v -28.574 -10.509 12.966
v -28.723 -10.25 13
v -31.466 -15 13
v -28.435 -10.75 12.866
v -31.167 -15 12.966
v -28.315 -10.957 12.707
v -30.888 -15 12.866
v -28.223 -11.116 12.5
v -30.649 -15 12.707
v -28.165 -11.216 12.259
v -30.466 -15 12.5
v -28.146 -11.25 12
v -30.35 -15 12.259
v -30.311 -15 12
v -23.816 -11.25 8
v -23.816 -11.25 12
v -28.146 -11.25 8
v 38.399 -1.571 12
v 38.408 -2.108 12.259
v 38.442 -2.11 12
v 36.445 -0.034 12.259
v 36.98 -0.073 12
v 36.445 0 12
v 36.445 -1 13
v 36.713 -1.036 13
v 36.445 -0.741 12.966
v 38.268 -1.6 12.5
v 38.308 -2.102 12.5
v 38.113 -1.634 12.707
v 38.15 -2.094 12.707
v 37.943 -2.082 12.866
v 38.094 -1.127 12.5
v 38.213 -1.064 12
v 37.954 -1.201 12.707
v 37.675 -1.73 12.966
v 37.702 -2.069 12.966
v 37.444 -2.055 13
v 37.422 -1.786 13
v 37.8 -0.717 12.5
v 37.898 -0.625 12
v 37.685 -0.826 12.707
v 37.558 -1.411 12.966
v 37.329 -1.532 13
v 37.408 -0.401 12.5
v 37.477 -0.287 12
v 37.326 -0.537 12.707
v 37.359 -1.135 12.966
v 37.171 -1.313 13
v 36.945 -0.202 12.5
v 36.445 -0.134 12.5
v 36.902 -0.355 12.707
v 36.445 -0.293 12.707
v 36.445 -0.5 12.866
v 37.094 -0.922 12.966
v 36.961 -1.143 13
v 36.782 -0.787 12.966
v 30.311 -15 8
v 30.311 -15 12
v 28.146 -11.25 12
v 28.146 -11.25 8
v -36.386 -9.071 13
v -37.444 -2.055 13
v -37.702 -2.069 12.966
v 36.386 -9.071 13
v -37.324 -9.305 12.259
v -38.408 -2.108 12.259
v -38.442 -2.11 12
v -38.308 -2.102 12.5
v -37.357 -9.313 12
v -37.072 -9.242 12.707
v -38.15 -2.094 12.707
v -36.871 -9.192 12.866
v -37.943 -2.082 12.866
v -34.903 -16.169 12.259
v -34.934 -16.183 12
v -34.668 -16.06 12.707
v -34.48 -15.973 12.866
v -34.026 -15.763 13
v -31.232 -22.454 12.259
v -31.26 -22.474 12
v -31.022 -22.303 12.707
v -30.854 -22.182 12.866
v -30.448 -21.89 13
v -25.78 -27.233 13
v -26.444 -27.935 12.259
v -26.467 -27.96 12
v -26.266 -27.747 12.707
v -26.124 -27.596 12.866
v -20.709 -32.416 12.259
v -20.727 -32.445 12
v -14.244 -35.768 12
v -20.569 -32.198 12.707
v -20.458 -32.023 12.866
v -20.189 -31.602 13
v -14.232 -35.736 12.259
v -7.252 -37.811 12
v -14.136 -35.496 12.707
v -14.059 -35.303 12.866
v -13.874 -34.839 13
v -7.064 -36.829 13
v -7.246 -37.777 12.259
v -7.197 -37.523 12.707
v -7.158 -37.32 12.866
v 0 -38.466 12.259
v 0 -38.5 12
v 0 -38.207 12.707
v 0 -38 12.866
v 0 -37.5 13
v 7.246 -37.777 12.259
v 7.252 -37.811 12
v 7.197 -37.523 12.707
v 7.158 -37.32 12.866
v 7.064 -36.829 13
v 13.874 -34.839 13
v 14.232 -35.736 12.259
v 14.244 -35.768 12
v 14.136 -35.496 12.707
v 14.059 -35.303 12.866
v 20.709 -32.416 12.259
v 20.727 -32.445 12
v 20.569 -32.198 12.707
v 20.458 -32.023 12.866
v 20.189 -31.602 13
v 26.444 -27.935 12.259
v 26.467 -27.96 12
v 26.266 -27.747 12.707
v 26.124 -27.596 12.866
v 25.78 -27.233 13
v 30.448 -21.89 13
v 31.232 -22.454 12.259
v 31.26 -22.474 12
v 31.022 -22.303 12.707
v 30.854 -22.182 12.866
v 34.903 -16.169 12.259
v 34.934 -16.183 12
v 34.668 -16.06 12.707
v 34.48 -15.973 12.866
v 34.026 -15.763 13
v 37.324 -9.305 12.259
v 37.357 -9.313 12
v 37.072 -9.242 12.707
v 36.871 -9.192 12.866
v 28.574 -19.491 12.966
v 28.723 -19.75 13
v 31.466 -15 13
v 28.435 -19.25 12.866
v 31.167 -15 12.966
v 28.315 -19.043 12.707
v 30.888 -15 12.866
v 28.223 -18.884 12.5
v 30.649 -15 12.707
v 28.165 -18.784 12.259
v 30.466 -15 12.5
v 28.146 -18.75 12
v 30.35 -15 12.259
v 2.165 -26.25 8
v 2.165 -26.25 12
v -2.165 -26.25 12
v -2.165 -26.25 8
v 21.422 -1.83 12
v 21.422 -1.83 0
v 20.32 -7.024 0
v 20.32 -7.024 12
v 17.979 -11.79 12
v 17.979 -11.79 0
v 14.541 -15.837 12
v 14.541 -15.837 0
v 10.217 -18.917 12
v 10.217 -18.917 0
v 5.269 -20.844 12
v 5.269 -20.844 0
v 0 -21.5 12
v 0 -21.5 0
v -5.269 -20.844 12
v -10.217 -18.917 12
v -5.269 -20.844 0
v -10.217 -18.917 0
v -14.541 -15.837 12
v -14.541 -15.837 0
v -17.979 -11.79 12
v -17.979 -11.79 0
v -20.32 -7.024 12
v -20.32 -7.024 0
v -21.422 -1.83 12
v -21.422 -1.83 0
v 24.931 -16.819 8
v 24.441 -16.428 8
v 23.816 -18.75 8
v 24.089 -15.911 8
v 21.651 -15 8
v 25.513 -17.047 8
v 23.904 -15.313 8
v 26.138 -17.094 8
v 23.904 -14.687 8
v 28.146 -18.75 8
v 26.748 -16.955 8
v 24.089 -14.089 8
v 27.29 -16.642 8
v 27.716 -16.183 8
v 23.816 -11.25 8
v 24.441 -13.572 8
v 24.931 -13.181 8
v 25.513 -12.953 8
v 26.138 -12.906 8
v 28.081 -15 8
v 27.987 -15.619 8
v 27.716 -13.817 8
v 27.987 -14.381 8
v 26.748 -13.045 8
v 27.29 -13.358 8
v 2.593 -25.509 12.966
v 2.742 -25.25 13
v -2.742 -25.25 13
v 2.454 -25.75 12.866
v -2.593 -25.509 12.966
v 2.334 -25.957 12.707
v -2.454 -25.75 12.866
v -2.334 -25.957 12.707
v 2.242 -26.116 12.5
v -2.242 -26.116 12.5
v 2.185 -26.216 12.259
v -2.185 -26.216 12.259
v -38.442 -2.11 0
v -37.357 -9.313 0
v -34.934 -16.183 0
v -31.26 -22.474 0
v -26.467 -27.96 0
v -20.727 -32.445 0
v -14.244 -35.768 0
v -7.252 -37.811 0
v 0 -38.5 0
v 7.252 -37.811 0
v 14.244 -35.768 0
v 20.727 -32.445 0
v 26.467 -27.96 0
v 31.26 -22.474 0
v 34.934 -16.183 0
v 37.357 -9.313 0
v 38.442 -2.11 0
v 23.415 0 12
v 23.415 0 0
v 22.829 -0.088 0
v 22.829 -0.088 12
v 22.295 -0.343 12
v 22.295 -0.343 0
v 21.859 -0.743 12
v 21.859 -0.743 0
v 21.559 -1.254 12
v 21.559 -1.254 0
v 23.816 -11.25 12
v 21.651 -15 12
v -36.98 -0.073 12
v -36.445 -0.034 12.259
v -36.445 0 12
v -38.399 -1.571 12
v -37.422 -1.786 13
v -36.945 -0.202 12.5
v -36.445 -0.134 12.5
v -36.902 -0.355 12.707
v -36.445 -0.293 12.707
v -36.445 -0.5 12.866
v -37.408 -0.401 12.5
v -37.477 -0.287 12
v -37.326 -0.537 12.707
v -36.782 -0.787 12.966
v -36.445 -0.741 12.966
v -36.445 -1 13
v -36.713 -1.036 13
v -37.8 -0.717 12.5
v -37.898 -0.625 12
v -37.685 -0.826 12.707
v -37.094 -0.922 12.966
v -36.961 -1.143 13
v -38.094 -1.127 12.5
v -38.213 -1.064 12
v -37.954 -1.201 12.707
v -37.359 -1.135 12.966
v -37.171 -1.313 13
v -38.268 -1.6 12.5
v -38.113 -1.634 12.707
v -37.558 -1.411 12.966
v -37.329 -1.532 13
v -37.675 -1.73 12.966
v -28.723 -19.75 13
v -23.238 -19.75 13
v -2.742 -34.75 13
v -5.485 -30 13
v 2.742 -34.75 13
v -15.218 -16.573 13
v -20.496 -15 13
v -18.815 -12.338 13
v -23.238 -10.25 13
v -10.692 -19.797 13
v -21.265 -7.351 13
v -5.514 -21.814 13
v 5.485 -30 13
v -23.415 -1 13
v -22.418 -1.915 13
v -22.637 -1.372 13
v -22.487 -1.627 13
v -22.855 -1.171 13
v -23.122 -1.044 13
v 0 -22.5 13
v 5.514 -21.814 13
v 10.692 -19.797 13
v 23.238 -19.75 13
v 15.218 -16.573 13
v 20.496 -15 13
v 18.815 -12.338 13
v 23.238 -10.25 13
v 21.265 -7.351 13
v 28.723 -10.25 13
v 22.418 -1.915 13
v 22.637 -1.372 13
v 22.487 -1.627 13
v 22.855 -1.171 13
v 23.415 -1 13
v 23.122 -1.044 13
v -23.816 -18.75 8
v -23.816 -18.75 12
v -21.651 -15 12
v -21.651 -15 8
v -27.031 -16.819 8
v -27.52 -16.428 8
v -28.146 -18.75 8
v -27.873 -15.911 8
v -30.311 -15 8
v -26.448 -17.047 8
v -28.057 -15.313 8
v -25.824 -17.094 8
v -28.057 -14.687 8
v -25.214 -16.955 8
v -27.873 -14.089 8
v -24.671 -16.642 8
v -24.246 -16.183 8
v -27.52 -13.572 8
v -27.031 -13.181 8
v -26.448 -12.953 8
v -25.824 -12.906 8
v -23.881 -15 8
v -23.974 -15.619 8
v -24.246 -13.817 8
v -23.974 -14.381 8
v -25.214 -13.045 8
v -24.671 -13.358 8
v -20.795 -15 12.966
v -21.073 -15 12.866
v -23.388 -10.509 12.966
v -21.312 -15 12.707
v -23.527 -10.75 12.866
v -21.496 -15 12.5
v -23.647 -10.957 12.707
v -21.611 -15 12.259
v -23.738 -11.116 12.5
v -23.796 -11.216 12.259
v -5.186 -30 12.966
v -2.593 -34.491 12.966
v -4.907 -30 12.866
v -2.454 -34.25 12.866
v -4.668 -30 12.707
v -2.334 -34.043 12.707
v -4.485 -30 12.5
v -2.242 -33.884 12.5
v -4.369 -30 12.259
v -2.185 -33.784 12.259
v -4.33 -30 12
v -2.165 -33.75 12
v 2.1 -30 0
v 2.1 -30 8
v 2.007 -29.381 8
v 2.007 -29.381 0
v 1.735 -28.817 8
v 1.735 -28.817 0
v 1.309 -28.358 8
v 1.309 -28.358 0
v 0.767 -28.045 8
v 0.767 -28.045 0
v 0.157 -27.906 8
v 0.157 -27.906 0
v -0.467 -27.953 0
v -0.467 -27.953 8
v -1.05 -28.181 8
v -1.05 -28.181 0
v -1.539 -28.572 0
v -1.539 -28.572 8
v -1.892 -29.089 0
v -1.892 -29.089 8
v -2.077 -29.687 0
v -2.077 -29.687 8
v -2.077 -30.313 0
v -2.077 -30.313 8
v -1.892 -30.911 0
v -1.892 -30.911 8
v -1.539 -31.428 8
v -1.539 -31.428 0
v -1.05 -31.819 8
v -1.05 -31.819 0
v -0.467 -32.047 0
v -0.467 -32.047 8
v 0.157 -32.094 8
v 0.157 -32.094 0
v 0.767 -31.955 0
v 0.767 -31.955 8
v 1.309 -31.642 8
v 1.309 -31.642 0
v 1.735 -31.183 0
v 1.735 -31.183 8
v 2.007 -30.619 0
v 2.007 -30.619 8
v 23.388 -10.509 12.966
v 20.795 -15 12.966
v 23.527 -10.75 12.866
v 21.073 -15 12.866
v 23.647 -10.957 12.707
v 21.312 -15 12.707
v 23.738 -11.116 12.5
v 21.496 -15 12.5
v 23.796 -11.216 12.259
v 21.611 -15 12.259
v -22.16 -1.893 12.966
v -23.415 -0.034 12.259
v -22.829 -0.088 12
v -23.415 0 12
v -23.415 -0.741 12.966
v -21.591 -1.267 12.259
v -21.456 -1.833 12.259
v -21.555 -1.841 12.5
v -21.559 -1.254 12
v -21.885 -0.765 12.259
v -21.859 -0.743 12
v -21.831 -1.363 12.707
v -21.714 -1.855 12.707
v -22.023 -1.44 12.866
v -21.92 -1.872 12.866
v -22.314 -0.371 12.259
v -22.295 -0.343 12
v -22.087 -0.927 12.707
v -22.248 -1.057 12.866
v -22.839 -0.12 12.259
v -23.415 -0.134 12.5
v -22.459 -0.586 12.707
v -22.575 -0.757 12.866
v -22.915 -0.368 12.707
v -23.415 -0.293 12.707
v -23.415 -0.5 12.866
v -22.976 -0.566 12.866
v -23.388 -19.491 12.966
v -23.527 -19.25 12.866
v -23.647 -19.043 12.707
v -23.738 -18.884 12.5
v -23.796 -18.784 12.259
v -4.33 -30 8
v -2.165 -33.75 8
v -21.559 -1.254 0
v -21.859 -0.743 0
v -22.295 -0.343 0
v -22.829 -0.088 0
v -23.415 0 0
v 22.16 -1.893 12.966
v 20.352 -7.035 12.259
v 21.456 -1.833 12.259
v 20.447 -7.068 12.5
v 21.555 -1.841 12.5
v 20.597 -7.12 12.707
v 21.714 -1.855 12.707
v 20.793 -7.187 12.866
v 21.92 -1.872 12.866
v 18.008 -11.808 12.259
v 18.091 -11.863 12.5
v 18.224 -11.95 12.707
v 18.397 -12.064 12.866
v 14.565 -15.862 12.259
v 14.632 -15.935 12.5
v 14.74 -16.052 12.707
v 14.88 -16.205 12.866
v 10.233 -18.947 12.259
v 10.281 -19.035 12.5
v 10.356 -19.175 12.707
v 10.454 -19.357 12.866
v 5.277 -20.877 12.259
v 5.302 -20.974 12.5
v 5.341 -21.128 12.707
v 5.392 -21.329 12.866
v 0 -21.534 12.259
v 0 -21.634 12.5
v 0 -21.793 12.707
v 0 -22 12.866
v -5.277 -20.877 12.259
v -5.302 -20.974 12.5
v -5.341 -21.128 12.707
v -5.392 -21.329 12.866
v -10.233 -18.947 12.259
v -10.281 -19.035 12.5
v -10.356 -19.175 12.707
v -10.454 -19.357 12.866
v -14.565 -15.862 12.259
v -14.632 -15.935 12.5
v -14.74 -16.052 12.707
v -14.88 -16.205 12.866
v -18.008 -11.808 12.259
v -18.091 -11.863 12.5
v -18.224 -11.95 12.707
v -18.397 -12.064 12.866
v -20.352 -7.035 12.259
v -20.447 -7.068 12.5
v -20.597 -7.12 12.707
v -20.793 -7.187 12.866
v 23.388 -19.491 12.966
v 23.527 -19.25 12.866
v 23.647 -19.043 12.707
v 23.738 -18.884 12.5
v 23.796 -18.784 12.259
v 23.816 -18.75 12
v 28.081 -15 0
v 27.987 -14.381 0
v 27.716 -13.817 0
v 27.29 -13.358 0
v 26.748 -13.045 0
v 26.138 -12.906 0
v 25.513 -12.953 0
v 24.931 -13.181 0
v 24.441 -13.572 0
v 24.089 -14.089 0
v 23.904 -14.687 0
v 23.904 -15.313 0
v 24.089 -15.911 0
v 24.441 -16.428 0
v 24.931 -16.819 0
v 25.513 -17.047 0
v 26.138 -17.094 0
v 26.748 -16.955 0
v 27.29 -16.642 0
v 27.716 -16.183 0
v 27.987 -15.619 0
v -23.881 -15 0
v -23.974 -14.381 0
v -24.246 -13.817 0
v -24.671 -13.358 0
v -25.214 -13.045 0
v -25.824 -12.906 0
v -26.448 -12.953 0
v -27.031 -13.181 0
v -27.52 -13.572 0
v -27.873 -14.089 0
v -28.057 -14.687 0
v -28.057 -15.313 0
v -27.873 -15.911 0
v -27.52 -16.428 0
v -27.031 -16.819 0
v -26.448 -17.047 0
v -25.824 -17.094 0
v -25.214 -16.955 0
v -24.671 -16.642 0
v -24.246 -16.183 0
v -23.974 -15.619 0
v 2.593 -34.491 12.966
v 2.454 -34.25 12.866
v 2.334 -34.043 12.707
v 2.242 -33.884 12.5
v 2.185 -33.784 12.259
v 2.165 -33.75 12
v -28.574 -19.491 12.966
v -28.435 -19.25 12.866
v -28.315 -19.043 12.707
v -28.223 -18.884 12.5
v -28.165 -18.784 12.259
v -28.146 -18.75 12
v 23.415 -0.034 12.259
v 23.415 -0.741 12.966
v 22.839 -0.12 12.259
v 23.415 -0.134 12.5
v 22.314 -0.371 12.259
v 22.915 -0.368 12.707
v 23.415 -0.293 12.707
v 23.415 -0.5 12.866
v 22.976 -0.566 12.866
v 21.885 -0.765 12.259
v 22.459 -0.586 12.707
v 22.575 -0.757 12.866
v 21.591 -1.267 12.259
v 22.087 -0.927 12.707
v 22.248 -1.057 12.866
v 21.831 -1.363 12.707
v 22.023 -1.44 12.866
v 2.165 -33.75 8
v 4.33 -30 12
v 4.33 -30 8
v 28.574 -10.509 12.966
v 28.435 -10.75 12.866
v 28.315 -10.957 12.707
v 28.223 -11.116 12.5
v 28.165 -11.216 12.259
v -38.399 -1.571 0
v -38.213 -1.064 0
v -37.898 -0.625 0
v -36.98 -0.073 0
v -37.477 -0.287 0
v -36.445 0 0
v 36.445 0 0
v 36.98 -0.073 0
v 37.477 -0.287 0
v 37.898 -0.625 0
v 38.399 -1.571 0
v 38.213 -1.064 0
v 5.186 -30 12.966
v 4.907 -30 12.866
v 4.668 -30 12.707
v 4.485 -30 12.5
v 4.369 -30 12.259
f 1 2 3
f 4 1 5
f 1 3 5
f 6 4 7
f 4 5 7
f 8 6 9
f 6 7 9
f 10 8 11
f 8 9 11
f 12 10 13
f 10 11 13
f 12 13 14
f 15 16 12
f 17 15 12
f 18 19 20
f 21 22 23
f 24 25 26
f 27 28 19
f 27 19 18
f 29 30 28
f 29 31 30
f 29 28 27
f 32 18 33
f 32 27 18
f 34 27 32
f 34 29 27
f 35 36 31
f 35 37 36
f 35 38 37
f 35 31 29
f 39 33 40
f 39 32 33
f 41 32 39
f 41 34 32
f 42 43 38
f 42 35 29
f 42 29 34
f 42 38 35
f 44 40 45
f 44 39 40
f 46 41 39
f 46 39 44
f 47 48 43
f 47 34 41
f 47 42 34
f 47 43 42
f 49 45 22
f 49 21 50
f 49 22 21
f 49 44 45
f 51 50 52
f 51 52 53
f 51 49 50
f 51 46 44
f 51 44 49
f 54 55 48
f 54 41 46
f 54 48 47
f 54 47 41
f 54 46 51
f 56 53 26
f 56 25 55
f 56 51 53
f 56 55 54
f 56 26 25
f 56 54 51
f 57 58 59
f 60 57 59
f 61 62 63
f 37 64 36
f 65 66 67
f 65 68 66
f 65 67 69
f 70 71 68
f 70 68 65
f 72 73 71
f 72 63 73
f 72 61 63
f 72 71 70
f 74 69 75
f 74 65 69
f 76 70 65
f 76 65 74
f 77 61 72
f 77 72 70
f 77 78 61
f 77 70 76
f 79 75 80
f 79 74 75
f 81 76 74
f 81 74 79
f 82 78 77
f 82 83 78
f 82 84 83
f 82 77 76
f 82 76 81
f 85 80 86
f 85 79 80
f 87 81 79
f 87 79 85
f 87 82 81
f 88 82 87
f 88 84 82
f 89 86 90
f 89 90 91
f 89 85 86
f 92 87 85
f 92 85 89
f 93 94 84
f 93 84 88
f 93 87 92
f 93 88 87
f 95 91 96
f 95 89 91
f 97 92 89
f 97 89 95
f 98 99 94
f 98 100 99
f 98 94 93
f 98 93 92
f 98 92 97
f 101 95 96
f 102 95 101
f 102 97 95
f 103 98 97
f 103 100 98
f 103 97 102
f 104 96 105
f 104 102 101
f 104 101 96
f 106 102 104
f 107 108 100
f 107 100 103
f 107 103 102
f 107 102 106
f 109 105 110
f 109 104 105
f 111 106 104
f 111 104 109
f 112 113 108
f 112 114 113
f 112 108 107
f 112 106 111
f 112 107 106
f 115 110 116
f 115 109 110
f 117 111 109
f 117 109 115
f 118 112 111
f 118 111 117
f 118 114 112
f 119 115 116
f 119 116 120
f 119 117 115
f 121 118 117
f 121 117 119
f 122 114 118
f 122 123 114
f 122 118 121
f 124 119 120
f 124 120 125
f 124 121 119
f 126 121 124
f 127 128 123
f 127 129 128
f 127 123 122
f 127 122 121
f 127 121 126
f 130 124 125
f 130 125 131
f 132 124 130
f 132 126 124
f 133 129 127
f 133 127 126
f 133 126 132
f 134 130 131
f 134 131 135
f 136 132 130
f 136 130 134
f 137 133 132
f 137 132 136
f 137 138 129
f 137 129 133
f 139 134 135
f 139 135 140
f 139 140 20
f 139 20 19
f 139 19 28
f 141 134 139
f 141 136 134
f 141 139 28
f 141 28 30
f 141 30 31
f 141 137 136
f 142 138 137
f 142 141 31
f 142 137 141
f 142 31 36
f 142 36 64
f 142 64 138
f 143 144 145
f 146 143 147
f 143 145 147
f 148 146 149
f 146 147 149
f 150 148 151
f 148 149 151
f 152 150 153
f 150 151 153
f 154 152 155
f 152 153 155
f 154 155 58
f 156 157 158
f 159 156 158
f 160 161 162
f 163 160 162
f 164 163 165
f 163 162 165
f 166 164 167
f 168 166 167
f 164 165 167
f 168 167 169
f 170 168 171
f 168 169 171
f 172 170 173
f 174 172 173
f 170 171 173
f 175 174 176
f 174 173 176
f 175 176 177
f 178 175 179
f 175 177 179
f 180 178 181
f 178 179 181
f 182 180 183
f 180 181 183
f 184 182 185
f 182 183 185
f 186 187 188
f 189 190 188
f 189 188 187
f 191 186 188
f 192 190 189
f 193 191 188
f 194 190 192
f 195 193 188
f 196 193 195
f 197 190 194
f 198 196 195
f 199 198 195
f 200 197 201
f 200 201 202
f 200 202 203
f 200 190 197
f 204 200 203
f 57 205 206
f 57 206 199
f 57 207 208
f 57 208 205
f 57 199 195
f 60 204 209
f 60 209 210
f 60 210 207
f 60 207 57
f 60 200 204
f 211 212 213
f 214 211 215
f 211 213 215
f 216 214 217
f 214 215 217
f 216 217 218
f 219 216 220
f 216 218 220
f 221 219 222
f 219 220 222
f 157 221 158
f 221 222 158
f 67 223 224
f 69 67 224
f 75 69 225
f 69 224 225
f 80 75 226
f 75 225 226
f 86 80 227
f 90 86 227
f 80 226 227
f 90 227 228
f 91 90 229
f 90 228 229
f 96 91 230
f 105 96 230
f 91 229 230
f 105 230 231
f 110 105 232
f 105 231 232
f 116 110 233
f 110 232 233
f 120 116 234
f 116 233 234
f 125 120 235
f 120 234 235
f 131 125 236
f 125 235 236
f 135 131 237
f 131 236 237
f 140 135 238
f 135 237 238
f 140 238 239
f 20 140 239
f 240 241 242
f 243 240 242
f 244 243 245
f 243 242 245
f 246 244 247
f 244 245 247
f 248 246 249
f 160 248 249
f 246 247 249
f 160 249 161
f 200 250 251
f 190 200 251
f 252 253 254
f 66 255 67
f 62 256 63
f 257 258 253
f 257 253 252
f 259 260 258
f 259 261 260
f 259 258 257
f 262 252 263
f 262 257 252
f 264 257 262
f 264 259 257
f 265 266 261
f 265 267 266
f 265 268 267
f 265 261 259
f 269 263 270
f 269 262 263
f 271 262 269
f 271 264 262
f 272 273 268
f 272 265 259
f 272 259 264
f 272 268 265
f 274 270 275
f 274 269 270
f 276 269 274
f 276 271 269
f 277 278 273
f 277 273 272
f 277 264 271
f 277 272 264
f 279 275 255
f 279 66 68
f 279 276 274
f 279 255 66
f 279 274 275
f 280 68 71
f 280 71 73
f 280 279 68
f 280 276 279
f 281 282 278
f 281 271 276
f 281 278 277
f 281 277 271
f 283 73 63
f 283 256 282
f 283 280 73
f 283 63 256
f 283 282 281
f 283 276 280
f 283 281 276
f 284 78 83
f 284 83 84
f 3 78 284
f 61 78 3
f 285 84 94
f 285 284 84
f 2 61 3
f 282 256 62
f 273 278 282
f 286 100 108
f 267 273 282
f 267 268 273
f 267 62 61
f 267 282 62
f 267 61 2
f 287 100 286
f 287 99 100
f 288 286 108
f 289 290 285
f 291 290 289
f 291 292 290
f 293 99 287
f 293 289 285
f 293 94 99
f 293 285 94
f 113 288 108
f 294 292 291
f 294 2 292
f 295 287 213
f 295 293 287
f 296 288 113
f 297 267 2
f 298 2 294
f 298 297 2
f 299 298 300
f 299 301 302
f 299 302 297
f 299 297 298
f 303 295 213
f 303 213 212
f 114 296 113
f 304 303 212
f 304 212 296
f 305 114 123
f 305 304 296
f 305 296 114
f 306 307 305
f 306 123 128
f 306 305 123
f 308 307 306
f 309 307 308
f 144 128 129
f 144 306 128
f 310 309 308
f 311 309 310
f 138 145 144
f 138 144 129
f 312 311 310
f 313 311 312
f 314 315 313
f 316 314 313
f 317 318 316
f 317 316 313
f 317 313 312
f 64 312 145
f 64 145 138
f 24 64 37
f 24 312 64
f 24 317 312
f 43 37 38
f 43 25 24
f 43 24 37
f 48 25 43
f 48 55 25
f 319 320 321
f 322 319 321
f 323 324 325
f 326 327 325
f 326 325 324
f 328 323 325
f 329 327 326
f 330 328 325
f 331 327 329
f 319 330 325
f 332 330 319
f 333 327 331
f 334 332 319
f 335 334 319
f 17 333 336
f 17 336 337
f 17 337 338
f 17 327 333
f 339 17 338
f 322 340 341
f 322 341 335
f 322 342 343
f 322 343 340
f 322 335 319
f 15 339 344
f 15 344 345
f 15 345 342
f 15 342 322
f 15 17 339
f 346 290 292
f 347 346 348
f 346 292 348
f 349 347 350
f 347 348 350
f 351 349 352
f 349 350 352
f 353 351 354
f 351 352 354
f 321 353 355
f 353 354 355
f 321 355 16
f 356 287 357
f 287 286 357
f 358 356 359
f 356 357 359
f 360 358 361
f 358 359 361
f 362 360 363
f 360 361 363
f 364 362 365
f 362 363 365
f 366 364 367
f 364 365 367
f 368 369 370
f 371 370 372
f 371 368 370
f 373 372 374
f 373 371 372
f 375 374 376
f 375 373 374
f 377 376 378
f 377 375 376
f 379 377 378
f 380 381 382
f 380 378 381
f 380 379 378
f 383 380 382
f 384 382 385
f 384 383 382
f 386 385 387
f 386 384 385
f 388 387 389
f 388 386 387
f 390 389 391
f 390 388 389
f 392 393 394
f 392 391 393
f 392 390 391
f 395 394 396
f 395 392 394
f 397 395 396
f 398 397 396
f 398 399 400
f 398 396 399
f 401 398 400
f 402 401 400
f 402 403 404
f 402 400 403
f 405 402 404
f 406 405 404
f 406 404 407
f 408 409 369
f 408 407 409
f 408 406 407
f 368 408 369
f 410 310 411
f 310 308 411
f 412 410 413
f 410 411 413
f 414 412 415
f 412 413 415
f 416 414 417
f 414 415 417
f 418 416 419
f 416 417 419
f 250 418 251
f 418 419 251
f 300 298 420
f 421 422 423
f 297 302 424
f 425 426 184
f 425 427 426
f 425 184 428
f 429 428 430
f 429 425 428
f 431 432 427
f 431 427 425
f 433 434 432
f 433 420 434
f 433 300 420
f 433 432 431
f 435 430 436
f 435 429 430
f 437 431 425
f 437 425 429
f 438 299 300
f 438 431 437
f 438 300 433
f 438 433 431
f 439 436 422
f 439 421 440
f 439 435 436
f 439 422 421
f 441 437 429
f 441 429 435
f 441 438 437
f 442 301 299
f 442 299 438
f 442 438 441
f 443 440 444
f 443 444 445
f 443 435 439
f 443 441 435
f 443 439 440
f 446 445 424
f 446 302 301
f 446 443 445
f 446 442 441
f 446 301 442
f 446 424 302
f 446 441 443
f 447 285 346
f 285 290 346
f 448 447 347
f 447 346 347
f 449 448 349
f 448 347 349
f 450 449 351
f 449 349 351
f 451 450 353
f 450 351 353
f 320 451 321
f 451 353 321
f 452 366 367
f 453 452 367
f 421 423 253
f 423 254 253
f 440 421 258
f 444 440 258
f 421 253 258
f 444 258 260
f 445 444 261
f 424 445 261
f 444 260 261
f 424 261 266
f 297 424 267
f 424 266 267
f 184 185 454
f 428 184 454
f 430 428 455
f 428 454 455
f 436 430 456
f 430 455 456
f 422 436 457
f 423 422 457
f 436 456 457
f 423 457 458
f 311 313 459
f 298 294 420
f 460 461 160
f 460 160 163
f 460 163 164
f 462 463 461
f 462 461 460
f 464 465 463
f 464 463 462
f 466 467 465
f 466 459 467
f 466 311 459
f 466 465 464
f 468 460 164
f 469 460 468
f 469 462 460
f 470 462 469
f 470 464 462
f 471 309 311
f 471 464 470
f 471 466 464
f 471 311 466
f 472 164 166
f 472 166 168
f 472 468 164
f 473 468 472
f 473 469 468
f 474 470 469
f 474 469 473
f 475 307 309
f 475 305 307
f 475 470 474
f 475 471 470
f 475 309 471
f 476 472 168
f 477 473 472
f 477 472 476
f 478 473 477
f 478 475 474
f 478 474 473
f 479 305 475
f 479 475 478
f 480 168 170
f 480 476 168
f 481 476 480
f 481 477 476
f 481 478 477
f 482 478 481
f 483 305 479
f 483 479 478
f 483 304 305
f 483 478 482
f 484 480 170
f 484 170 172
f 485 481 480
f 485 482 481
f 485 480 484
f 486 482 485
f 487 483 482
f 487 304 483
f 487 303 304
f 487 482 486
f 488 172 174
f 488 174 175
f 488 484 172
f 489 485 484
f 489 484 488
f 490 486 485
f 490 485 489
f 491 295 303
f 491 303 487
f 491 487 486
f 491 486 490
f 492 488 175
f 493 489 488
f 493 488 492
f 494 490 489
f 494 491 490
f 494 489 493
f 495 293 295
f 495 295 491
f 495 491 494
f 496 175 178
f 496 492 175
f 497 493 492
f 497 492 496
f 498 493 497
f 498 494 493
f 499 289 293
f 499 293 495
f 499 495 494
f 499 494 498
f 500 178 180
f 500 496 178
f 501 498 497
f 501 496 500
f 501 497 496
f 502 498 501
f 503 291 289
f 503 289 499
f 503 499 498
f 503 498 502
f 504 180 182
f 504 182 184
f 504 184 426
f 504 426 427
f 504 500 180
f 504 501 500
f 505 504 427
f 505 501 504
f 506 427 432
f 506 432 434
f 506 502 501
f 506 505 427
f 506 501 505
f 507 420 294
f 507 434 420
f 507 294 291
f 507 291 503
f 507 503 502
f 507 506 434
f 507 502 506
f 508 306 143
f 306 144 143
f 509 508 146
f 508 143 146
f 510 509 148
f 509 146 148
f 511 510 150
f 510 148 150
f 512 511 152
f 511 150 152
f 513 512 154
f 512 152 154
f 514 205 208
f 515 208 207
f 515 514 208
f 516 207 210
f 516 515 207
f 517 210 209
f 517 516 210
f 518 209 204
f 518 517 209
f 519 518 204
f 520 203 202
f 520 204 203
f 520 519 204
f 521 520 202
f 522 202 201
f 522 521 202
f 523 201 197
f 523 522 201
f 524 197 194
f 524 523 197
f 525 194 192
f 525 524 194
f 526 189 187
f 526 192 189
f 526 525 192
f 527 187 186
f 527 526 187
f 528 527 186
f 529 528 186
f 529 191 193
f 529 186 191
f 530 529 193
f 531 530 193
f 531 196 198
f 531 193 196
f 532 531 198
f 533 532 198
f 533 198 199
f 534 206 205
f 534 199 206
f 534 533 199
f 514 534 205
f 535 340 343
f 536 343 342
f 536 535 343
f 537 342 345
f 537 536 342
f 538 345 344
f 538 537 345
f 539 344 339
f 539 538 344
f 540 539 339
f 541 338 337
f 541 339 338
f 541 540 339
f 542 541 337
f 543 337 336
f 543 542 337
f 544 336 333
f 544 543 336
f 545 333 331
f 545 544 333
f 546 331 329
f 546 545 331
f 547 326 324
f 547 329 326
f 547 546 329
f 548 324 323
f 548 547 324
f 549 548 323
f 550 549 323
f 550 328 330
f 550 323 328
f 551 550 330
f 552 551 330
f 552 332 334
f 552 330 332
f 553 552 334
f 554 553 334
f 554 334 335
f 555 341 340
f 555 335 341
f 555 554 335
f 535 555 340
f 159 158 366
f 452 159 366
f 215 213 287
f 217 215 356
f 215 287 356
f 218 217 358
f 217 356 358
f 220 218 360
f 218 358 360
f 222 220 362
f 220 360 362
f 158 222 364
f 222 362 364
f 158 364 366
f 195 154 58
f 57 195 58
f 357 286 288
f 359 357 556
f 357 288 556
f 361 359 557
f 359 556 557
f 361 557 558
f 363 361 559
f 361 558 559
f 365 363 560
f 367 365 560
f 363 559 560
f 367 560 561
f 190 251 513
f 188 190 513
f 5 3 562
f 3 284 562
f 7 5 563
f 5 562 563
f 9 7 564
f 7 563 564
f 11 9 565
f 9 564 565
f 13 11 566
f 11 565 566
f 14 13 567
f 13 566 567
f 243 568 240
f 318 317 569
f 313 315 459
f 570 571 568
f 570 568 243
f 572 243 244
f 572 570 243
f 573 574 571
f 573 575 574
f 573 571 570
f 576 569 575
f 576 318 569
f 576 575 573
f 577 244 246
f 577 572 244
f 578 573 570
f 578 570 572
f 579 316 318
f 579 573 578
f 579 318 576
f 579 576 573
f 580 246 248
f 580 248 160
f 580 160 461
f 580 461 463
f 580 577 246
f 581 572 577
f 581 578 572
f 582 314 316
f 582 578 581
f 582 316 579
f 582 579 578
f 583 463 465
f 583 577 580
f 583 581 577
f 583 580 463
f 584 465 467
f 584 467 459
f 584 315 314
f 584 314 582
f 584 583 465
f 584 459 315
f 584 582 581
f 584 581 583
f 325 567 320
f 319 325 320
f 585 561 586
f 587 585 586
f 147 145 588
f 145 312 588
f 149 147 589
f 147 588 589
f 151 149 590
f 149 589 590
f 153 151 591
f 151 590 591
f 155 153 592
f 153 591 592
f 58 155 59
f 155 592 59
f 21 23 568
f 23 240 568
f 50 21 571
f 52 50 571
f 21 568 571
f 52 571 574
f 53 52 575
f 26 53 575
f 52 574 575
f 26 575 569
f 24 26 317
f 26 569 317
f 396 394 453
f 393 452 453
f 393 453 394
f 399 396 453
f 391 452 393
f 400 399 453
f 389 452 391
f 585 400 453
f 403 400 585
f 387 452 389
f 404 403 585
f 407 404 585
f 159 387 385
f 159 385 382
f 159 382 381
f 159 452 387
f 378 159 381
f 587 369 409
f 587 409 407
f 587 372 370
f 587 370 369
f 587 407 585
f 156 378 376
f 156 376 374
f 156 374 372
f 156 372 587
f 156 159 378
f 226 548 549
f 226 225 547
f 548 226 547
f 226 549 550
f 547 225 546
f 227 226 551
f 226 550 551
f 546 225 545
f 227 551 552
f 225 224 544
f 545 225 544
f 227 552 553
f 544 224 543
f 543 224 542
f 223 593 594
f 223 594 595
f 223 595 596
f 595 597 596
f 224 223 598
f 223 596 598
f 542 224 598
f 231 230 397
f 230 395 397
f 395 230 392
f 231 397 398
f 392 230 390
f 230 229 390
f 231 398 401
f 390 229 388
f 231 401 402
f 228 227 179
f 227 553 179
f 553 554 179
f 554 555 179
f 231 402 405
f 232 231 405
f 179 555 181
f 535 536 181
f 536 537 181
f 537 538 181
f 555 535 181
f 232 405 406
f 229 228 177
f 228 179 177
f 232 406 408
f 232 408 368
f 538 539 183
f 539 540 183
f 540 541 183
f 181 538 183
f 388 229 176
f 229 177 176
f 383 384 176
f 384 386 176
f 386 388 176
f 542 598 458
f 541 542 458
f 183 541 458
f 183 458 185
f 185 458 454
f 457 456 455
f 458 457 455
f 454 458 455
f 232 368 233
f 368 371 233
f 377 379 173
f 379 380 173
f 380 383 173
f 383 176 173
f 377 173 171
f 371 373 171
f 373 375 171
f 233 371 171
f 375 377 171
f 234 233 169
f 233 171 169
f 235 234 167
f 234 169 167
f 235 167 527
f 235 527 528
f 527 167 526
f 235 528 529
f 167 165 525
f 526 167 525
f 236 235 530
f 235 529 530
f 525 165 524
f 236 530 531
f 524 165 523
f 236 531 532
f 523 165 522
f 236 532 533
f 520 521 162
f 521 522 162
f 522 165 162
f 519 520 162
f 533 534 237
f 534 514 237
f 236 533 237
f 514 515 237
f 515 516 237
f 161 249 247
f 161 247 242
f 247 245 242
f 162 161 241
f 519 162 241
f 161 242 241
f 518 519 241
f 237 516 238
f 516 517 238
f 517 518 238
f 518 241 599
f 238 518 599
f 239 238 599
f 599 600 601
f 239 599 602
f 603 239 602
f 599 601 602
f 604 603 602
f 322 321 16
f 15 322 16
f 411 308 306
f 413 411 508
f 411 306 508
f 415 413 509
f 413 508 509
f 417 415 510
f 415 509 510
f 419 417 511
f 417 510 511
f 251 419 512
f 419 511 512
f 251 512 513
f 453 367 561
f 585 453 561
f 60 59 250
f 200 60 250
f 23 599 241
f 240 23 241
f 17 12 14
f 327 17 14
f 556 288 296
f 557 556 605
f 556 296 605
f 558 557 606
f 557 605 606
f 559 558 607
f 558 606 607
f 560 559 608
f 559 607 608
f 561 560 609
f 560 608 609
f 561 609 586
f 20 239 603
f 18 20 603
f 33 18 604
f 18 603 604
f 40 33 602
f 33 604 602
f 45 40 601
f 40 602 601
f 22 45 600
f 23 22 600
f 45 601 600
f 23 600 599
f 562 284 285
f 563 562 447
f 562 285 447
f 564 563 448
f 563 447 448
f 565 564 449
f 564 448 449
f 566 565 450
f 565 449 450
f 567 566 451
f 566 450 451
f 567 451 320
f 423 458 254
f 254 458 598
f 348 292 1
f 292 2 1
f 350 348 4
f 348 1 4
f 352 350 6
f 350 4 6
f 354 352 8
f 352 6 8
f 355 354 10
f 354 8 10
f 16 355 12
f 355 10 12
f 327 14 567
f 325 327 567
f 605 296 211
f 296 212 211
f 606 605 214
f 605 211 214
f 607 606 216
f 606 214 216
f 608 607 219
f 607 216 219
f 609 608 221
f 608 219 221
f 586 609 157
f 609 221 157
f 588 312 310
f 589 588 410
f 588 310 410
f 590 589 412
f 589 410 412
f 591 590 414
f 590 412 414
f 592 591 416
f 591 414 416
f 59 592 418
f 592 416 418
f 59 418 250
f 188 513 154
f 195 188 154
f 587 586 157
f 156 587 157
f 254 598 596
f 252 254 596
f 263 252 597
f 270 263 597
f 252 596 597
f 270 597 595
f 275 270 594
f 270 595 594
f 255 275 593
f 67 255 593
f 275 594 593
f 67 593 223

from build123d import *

# Parameters (mm, degrees)
F1_DEPTH = 13
F2_R     = 2.1
F3_DEPTH = 13.001
F5_DEPTH = 5
F6_R     = 1


with BuildPart() as f1:
    # F0 (on Top) → F1 (new body)
    with BuildSketch(Plane.XY):
        with BuildLine():
            ThreePointArc((21.421995, -1.829787), (0, -21.5), (-21.421995, -1.829787))
            ThreePointArc((-21.421995, -1.829787), (-22.062043, -0.526836), (-23.414739, 0))
            Line((-23.414739, 0), (-36.445164, 0))
            ThreePointArc((-36.445164, 0), (-37.897607, -0.625078), (-38.44216, -2.109589))
            ThreePointArc((-38.44216, -2.109589), (0, -38.5), (38.44216, -2.109589))
            ThreePointArc((38.44216, -2.109589), (37.897607, -0.625078), (36.445164, 0))
            Line((36.445164, 0), (23.414739, 0))
            ThreePointArc((23.414739, 0), (22.062043, -0.526836), (21.421995, -1.829787))
        make_face()
    extrude(amount=F1_DEPTH)

    # F2 (on face) → F3 (cut, through all)
    with BuildSketch(Plane.XY):
        with Locations((-25.980762, -15)):
            Circle(F2_R)
        with Locations((0, -30)):
            Circle(F2_R)
        with Locations((25.980762, -15)):
            Circle(F2_R)
    extrude(amount=F3_DEPTH, mode=Mode.SUBTRACT)

    # F4 (on face) → F5 (cut)
    with BuildSketch(Plane.XY.offset(13)):
        Polygon((-23.815699, -18.75), (-21.650635, -15), (-23.815699, -11.25), (-28.145826, -11.25), (-30.310889, -15), (-28.145826, -18.75), align=None)
        Polygon((-2.165064, -33.75), (2.165064, -33.75), (4.330127, -30), (2.165064, -26.25), (-2.165064, -26.25), (-4.330127, -30), align=None)
        Polygon((23.815699, -18.75), (28.145826, -18.75), (30.310889, -15), (28.145826, -11.25), (23.815699, -11.25), (21.650635, -15), align=None)
    extrude(amount=-F5_DEPTH, mode=Mode.SUBTRACT)

    # F6
    f6_edges = [f1.edges().sort_by_distance(p)[0] for p in [
        (0, -21.5, 13),
        (22.062043, -0.526836, 13),
        (-22.062043, -0.526836, 13),
        (29.929952, 0, 13),
        (-29.929952, 0, 13),
        (37.897607, -0.625078, 13),
        (-37.897607, -0.625078, 13),
        (0, -38.5, 13),
        (-3.247595, -31.875, 13),
        (0, -33.75, 13),
        (3.247595, -31.875, 13),
        (3.247595, -28.125, 13),
        (0, -26.25, 13),
        (-3.247595, -28.125, 13),
        (-22.733167, -16.875, 13),
        (-22.733167, -13.125, 13),
        (-25.980762, -11.25, 13),
        (-29.228357, -13.125, 13),
        (-29.228357, -16.875, 13),
        (-25.980762, -18.75, 13),
        (22.733167, -16.875, 13),
        (25.980762, -18.75, 13),
        (29.228357, -16.875, 13),
        (29.228357, -13.125, 13),
        (25.980762, -11.25, 13),
        (22.733167, -13.125, 13),
    ]]
    fillet(f6_edges, radius=F6_R)


solid = f1.part
